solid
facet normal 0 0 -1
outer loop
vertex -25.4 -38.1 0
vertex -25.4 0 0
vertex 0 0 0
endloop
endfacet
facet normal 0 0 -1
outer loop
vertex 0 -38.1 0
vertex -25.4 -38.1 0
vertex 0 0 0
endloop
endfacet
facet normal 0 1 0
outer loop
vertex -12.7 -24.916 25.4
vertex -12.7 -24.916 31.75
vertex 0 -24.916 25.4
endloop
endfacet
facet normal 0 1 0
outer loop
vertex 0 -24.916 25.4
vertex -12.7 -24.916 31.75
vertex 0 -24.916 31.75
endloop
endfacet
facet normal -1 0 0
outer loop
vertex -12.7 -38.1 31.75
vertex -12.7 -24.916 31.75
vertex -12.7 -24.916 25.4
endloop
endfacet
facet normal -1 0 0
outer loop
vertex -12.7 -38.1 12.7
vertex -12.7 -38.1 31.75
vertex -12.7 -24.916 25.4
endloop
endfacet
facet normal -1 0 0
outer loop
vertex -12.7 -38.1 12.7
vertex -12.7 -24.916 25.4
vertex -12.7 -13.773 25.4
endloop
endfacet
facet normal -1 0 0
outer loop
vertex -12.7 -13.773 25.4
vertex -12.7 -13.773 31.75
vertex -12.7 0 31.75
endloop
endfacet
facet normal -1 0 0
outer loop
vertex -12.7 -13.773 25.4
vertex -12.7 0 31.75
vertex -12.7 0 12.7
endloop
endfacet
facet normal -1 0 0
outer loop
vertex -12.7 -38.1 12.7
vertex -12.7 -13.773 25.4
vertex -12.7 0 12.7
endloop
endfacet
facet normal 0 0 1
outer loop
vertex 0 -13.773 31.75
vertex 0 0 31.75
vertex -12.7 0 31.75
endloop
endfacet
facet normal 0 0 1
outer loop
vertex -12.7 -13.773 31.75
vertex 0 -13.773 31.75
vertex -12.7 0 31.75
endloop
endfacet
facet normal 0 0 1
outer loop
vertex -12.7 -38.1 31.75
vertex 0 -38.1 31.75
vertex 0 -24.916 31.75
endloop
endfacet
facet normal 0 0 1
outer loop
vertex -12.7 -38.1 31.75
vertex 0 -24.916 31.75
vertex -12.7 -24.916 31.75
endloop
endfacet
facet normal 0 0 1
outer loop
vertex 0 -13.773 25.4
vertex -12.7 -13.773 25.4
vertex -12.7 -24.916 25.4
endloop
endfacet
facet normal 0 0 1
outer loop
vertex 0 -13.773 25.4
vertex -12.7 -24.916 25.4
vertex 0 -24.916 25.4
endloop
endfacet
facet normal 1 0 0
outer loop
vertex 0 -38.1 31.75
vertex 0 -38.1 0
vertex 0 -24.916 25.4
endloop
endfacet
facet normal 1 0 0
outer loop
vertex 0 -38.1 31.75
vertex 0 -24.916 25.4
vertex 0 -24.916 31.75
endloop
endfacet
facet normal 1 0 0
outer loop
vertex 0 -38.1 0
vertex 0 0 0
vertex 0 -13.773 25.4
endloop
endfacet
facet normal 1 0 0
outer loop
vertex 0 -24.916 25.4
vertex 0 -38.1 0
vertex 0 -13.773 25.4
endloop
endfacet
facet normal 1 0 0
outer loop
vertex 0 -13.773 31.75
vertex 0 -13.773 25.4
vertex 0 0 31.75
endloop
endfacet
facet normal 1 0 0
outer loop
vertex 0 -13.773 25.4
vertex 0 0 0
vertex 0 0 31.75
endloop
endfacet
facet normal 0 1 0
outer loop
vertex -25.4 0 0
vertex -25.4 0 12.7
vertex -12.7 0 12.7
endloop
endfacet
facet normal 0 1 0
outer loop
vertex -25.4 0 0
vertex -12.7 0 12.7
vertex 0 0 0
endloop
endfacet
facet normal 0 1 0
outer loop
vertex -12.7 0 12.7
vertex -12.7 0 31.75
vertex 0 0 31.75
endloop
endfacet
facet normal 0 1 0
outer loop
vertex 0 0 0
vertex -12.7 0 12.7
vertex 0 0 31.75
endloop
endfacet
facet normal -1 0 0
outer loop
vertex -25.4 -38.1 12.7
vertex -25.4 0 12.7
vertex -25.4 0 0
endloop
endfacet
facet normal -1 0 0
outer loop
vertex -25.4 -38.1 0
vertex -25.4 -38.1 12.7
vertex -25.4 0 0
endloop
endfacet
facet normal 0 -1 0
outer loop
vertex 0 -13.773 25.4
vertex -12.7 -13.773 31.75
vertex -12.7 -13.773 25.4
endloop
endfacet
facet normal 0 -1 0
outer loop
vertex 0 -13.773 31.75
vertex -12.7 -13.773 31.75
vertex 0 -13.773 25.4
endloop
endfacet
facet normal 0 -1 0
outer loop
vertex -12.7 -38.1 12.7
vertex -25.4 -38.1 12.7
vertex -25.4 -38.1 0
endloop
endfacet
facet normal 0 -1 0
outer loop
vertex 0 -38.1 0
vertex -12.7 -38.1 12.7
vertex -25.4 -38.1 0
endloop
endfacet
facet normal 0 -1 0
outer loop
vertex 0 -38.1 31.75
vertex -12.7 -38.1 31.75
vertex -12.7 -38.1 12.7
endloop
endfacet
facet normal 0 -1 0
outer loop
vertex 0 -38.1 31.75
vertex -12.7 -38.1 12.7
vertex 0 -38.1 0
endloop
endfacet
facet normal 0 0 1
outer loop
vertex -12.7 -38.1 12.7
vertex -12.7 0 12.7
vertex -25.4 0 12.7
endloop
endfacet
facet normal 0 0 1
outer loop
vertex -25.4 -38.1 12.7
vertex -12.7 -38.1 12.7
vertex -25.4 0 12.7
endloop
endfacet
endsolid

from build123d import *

# Parameters (mm, degrees)
F1_DEPTH = 38.1
F2_W     = 12.7
F2_H     = 11.142593
F3_DEPTH = 6.35


with BuildPart() as f1:
    # F0 (on Front) → F1 (new body)
    with BuildSketch(Plane.XZ):
        Polygon((-25.4, 0), (0, 0), (0, 31.75), (-12.7, 31.75), (-12.7, 12.7), (-25.4, 12.7), align=None)
    extrude(amount=F1_DEPTH)

    # F2 (on face) → F3 (cut)
    with BuildSketch(Plane.XY.offset(31.75)):
        with Locations((-6.35, -19.344779)):
            Rectangle(F2_W, F2_H)
    extrude(amount=-F3_DEPTH, mode=Mode.SUBTRACT)


solid = f1.part
